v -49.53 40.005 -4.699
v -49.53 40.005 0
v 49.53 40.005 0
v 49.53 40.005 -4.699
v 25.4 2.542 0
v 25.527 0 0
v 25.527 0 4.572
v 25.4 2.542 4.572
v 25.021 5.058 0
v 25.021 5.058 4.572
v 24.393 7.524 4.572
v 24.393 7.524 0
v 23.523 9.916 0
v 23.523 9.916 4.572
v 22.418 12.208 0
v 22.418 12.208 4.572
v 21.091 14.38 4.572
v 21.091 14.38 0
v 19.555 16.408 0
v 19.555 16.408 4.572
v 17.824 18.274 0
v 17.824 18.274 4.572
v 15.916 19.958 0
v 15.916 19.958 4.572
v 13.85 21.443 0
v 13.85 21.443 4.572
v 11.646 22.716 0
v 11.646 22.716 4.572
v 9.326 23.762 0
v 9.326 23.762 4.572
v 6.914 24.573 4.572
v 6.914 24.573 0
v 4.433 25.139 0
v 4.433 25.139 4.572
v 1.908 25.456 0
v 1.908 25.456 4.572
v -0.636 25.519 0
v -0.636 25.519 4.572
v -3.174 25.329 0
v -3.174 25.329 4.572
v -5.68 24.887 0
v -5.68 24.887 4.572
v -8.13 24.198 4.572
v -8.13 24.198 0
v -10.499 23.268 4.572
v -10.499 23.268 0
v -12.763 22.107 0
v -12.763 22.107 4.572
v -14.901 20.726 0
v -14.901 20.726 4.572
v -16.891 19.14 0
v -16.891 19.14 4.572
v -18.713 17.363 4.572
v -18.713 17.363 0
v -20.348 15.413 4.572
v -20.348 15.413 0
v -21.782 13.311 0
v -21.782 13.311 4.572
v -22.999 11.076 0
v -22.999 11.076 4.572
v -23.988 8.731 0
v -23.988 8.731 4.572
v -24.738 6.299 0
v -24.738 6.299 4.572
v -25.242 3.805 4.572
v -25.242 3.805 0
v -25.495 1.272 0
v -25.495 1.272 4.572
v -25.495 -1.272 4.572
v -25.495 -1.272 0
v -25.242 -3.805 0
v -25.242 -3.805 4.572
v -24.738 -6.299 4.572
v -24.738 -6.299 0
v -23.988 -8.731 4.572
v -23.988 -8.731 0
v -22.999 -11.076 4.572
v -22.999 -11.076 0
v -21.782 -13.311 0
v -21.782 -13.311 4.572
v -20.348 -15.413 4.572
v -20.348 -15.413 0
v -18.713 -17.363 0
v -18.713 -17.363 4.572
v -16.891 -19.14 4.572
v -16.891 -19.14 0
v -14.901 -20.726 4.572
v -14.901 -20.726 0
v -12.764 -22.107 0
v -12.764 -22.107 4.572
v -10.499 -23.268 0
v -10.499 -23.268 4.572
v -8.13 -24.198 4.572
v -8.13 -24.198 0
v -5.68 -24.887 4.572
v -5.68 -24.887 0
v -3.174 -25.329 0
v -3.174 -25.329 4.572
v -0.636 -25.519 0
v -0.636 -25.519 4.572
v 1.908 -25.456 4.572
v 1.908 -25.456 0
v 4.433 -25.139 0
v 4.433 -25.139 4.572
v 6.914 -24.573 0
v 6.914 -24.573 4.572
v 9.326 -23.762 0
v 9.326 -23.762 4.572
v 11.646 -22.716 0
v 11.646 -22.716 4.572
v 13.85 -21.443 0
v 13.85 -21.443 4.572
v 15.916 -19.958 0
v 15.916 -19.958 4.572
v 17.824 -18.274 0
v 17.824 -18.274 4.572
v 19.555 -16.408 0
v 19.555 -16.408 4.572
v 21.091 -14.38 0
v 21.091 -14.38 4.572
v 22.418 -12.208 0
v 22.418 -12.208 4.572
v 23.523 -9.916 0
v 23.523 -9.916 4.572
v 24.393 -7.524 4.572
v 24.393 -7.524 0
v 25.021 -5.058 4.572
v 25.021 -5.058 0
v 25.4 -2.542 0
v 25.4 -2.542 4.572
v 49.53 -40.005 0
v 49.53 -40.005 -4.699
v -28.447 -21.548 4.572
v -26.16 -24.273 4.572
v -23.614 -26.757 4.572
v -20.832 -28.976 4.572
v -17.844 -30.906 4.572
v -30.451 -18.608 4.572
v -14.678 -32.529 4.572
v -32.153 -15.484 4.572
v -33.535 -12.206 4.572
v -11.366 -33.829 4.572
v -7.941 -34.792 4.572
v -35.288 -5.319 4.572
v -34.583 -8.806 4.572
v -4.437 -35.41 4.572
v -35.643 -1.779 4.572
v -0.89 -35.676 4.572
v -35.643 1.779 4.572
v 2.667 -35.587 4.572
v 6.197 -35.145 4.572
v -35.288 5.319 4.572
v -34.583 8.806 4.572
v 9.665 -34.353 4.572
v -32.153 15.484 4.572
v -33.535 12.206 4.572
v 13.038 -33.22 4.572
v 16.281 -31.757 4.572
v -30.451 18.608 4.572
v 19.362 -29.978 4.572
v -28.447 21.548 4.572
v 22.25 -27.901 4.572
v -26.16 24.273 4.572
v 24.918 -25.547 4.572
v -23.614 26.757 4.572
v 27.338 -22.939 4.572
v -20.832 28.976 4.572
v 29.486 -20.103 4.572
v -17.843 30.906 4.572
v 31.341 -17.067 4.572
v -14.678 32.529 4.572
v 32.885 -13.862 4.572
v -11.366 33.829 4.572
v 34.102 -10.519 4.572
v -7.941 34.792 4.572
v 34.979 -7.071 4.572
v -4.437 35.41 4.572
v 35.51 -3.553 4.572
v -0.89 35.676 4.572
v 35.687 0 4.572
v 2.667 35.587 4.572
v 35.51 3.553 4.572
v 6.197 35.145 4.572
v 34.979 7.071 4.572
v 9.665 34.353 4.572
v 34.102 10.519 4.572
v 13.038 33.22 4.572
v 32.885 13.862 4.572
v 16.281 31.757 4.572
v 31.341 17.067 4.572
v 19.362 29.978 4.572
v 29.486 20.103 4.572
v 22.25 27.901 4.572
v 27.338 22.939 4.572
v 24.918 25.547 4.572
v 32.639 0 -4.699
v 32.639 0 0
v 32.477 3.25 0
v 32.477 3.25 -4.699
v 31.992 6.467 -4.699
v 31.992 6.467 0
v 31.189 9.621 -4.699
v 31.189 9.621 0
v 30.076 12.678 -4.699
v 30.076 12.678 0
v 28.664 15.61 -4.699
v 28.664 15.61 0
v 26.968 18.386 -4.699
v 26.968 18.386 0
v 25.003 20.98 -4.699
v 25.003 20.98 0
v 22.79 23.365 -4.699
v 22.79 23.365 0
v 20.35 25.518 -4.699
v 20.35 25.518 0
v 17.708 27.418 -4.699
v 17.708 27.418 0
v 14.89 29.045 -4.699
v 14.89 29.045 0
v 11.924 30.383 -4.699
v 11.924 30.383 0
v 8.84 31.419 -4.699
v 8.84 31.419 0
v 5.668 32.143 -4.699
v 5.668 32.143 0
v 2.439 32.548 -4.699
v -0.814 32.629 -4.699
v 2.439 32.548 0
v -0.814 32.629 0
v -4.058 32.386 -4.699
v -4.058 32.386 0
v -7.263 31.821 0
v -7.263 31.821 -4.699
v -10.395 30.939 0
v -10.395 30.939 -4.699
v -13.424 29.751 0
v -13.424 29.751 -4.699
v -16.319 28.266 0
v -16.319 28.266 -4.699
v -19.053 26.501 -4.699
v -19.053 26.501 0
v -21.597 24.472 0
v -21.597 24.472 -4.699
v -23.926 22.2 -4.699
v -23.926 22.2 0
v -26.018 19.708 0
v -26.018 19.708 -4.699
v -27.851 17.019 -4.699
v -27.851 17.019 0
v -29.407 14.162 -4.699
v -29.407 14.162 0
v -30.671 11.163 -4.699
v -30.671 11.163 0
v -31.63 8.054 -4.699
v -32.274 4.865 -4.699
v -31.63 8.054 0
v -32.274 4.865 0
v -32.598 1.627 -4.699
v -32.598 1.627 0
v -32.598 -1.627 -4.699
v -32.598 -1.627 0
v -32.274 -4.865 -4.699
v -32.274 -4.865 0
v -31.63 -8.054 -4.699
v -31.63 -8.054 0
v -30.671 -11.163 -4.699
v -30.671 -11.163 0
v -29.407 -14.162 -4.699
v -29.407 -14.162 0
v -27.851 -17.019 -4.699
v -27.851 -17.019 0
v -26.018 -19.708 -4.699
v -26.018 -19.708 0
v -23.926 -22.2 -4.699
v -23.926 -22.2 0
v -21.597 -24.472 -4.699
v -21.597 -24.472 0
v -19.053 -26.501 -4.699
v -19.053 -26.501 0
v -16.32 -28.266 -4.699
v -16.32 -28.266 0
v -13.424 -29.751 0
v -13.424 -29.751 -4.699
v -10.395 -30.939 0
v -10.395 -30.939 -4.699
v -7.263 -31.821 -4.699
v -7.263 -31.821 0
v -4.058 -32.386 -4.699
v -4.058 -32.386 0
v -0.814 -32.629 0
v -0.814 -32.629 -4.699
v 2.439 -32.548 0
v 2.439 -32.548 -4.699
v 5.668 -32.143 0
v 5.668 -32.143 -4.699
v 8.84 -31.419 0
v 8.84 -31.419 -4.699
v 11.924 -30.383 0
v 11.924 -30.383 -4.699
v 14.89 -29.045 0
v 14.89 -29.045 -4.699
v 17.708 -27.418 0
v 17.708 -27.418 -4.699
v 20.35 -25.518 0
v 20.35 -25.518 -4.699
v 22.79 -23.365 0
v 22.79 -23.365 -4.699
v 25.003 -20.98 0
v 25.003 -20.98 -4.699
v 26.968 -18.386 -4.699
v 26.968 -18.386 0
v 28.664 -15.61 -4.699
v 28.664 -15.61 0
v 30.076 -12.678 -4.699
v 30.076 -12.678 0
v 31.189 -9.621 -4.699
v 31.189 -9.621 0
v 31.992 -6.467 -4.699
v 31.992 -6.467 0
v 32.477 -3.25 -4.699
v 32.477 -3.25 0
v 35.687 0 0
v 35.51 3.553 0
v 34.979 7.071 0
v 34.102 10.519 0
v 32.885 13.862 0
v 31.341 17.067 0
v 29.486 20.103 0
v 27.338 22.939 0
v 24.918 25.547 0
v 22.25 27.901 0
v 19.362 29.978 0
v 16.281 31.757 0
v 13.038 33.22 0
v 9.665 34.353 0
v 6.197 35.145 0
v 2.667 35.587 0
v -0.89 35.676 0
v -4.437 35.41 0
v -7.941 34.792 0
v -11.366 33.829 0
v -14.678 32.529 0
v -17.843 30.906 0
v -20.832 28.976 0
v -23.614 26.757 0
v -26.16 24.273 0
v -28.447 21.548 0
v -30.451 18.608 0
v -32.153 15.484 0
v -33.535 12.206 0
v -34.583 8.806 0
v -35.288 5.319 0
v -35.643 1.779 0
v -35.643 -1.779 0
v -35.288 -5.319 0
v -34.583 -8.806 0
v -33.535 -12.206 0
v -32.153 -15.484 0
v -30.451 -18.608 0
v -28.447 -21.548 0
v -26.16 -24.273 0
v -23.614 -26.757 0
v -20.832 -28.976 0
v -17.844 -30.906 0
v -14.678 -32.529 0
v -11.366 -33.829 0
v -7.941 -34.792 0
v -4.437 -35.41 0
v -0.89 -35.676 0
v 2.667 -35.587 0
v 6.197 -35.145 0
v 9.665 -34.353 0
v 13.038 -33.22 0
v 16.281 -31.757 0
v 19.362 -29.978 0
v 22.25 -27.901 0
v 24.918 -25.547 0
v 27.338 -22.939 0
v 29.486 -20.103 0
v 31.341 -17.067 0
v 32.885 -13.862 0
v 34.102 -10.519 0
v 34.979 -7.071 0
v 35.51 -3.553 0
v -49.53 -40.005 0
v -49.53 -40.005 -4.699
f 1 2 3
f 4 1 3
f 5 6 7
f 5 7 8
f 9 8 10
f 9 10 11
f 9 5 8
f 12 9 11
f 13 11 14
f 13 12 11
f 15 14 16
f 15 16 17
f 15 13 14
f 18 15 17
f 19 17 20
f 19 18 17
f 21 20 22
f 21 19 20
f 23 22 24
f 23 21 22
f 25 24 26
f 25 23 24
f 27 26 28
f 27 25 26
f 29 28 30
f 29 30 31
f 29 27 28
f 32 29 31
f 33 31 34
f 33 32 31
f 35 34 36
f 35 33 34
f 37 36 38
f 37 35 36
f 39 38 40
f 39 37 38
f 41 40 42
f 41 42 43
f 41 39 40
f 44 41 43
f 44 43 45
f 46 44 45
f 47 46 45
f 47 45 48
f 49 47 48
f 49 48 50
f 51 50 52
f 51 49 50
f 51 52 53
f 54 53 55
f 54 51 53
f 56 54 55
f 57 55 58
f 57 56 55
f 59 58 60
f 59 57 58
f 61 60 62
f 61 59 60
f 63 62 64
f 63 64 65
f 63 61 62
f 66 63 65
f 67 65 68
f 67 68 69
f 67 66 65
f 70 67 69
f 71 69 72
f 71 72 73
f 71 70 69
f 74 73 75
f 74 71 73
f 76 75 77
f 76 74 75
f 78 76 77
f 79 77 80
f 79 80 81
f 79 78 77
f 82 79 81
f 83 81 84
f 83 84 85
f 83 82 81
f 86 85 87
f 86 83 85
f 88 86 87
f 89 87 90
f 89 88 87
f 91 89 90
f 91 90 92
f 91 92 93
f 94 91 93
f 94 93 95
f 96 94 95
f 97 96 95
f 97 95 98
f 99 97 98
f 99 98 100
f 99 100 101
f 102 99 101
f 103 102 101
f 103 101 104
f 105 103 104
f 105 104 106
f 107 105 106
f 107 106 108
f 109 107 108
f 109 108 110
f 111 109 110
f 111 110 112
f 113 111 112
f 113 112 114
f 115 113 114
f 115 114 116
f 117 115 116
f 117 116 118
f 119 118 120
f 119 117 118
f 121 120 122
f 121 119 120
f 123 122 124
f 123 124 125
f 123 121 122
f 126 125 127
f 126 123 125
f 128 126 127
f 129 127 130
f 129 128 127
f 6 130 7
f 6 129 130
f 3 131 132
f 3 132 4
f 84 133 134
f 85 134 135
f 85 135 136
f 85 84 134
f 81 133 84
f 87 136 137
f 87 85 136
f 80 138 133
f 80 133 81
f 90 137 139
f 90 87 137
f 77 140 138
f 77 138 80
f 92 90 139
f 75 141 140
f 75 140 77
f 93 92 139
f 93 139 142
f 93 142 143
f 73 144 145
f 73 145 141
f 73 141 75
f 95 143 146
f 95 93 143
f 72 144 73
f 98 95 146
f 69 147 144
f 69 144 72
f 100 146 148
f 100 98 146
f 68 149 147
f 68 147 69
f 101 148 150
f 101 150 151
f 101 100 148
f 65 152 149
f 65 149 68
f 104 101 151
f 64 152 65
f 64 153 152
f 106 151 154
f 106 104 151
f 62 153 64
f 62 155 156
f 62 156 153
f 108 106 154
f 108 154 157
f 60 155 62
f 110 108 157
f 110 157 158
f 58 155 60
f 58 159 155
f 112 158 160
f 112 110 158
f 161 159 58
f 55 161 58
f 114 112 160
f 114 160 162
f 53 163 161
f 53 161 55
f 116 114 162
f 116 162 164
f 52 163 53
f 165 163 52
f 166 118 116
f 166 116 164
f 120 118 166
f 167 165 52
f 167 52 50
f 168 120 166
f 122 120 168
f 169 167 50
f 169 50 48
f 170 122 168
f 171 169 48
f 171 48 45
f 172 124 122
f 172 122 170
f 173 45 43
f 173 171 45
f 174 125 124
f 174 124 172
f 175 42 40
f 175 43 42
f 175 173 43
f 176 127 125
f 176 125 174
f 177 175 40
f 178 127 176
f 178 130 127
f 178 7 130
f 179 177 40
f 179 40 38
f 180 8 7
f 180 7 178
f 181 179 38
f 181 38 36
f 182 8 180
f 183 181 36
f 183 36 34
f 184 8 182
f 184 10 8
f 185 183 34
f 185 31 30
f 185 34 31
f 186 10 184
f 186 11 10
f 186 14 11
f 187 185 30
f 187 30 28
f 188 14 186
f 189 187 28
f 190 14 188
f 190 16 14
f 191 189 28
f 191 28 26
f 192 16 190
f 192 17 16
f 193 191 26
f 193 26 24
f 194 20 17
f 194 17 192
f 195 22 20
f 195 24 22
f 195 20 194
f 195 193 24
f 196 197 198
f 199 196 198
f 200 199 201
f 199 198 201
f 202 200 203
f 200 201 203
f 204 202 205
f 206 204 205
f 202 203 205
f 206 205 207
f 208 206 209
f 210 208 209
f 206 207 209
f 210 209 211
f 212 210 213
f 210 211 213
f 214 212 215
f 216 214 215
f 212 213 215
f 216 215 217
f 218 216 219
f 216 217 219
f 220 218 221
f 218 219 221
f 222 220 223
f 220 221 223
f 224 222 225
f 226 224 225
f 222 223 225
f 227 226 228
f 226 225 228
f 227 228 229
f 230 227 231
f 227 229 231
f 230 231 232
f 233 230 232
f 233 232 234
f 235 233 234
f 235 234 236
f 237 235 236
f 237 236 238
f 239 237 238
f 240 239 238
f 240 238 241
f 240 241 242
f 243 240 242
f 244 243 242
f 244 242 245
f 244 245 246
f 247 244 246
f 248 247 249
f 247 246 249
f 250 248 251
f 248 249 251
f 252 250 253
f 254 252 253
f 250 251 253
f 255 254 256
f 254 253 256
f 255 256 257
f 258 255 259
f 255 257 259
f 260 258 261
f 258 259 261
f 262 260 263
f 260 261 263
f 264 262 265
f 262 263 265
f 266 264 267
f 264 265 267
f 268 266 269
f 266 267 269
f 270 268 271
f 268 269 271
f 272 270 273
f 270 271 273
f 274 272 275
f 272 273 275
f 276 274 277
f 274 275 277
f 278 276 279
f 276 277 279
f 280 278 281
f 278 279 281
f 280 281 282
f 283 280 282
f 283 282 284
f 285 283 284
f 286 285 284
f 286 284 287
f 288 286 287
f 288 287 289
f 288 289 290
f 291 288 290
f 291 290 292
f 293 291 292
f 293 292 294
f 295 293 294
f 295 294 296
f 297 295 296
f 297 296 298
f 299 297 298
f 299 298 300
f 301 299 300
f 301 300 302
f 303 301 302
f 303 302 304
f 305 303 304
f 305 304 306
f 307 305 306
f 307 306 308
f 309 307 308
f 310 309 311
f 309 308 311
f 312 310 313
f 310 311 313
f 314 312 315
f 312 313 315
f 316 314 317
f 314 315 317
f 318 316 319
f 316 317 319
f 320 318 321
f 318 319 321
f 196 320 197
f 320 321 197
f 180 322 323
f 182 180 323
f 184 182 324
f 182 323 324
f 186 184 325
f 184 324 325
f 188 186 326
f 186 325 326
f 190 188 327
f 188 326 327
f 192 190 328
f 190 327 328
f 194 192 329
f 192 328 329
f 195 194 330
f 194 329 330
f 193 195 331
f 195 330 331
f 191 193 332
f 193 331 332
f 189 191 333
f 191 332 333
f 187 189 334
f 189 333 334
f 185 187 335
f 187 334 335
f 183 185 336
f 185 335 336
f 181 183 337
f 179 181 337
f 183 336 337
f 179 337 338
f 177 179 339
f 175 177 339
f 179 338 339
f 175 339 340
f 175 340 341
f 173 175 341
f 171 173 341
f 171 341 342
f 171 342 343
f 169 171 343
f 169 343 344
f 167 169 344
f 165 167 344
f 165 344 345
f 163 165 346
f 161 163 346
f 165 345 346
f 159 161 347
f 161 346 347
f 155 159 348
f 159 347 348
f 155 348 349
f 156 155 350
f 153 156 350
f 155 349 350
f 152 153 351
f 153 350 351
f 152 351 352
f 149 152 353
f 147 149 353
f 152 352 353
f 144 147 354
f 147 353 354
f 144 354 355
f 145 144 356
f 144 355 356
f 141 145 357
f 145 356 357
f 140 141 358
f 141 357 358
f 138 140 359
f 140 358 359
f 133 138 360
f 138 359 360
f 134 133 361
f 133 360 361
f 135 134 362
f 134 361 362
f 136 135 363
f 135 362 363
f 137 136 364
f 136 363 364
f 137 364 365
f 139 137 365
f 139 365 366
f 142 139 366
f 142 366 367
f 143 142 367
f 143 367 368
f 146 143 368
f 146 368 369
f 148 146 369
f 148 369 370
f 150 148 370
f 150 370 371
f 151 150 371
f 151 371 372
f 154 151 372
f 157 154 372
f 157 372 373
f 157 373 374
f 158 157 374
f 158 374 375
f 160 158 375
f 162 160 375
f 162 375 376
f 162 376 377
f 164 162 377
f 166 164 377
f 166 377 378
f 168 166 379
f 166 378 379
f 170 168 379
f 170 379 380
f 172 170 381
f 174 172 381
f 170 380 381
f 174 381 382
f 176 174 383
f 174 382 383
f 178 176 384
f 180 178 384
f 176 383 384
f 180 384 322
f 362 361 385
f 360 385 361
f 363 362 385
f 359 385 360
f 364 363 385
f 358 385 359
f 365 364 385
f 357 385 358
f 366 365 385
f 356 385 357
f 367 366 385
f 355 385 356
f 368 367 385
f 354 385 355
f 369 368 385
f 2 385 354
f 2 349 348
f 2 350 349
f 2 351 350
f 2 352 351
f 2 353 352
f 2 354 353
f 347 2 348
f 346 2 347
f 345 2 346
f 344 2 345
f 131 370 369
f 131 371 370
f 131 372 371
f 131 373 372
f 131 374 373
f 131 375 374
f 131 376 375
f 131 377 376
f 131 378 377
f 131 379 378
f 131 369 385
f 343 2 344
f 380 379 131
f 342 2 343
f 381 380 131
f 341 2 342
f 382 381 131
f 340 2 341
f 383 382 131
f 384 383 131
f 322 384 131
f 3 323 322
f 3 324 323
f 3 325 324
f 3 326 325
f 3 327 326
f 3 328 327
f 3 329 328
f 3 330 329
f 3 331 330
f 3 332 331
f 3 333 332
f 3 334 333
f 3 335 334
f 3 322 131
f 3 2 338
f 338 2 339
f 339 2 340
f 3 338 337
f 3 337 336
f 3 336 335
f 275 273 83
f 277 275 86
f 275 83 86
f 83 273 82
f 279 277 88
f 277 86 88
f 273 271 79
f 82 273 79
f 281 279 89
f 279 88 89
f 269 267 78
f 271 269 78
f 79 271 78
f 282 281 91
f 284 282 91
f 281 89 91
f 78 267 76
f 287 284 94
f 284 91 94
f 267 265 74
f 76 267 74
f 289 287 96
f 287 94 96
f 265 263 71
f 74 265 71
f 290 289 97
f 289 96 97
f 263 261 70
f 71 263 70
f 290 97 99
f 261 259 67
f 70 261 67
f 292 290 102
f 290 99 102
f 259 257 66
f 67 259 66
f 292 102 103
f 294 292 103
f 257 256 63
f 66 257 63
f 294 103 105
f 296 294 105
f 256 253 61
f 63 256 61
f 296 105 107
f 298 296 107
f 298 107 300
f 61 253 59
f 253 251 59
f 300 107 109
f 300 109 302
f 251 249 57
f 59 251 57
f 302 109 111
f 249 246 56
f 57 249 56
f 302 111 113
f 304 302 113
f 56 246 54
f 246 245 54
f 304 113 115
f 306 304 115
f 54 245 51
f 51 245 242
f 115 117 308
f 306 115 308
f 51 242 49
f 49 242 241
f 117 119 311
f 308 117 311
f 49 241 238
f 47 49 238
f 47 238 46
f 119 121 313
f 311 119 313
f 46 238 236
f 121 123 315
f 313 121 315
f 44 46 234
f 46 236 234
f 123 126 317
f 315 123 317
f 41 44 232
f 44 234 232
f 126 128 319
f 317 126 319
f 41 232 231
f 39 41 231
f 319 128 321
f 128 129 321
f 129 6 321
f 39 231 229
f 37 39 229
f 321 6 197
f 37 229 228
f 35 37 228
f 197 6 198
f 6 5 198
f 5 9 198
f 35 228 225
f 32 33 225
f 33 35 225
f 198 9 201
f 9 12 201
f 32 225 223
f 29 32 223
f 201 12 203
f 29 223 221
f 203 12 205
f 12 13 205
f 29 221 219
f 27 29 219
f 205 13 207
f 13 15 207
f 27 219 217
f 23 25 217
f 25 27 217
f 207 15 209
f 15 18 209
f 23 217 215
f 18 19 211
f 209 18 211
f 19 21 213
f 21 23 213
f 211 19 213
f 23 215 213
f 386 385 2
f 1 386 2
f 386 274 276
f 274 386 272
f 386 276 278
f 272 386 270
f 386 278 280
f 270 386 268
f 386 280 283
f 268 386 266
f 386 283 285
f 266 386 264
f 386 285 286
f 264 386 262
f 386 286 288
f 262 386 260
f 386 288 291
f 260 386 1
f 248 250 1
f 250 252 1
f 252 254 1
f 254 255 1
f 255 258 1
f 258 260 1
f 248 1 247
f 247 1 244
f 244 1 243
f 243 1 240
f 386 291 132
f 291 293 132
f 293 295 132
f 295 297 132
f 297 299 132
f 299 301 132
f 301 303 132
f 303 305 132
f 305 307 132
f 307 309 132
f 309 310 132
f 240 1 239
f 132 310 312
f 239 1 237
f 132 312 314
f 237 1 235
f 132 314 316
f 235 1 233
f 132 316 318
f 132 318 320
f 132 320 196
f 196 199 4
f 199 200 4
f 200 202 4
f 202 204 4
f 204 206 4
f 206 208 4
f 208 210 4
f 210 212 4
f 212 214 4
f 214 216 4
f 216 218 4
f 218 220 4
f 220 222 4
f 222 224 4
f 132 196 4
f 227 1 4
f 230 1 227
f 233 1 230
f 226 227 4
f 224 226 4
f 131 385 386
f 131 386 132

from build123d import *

# Parameters (mm, degrees)
F0_W     = 99.06
F0_H     = 80.01
F0_R     = 35.687
F0_R_2   = 32.639
F1_DEPTH = 4.699
F0_R_3   = 25.527
F2_DEPTH = 4.572


with BuildPart() as f1:
    # F0 (on Top) → F1 (new body)
    with BuildSketch(Plane.XY):
        Rectangle(F0_W, F0_H)
        Circle(F0_R, mode=Mode.SUBTRACT)
        Circle(F0_R)
        Circle(F0_R_2, mode=Mode.SUBTRACT)
    extrude(amount=-F1_DEPTH)

    # F0 (on Top) → F2 (join)
    with BuildSketch(Plane.XY):
        Circle(F0_R)
        Circle(F0_R_2, mode=Mode.SUBTRACT)
        Circle(F0_R_2)
        Circle(F0_R_3, mode=Mode.SUBTRACT)
    extrude(amount=F2_DEPTH)


solid = f1.part
